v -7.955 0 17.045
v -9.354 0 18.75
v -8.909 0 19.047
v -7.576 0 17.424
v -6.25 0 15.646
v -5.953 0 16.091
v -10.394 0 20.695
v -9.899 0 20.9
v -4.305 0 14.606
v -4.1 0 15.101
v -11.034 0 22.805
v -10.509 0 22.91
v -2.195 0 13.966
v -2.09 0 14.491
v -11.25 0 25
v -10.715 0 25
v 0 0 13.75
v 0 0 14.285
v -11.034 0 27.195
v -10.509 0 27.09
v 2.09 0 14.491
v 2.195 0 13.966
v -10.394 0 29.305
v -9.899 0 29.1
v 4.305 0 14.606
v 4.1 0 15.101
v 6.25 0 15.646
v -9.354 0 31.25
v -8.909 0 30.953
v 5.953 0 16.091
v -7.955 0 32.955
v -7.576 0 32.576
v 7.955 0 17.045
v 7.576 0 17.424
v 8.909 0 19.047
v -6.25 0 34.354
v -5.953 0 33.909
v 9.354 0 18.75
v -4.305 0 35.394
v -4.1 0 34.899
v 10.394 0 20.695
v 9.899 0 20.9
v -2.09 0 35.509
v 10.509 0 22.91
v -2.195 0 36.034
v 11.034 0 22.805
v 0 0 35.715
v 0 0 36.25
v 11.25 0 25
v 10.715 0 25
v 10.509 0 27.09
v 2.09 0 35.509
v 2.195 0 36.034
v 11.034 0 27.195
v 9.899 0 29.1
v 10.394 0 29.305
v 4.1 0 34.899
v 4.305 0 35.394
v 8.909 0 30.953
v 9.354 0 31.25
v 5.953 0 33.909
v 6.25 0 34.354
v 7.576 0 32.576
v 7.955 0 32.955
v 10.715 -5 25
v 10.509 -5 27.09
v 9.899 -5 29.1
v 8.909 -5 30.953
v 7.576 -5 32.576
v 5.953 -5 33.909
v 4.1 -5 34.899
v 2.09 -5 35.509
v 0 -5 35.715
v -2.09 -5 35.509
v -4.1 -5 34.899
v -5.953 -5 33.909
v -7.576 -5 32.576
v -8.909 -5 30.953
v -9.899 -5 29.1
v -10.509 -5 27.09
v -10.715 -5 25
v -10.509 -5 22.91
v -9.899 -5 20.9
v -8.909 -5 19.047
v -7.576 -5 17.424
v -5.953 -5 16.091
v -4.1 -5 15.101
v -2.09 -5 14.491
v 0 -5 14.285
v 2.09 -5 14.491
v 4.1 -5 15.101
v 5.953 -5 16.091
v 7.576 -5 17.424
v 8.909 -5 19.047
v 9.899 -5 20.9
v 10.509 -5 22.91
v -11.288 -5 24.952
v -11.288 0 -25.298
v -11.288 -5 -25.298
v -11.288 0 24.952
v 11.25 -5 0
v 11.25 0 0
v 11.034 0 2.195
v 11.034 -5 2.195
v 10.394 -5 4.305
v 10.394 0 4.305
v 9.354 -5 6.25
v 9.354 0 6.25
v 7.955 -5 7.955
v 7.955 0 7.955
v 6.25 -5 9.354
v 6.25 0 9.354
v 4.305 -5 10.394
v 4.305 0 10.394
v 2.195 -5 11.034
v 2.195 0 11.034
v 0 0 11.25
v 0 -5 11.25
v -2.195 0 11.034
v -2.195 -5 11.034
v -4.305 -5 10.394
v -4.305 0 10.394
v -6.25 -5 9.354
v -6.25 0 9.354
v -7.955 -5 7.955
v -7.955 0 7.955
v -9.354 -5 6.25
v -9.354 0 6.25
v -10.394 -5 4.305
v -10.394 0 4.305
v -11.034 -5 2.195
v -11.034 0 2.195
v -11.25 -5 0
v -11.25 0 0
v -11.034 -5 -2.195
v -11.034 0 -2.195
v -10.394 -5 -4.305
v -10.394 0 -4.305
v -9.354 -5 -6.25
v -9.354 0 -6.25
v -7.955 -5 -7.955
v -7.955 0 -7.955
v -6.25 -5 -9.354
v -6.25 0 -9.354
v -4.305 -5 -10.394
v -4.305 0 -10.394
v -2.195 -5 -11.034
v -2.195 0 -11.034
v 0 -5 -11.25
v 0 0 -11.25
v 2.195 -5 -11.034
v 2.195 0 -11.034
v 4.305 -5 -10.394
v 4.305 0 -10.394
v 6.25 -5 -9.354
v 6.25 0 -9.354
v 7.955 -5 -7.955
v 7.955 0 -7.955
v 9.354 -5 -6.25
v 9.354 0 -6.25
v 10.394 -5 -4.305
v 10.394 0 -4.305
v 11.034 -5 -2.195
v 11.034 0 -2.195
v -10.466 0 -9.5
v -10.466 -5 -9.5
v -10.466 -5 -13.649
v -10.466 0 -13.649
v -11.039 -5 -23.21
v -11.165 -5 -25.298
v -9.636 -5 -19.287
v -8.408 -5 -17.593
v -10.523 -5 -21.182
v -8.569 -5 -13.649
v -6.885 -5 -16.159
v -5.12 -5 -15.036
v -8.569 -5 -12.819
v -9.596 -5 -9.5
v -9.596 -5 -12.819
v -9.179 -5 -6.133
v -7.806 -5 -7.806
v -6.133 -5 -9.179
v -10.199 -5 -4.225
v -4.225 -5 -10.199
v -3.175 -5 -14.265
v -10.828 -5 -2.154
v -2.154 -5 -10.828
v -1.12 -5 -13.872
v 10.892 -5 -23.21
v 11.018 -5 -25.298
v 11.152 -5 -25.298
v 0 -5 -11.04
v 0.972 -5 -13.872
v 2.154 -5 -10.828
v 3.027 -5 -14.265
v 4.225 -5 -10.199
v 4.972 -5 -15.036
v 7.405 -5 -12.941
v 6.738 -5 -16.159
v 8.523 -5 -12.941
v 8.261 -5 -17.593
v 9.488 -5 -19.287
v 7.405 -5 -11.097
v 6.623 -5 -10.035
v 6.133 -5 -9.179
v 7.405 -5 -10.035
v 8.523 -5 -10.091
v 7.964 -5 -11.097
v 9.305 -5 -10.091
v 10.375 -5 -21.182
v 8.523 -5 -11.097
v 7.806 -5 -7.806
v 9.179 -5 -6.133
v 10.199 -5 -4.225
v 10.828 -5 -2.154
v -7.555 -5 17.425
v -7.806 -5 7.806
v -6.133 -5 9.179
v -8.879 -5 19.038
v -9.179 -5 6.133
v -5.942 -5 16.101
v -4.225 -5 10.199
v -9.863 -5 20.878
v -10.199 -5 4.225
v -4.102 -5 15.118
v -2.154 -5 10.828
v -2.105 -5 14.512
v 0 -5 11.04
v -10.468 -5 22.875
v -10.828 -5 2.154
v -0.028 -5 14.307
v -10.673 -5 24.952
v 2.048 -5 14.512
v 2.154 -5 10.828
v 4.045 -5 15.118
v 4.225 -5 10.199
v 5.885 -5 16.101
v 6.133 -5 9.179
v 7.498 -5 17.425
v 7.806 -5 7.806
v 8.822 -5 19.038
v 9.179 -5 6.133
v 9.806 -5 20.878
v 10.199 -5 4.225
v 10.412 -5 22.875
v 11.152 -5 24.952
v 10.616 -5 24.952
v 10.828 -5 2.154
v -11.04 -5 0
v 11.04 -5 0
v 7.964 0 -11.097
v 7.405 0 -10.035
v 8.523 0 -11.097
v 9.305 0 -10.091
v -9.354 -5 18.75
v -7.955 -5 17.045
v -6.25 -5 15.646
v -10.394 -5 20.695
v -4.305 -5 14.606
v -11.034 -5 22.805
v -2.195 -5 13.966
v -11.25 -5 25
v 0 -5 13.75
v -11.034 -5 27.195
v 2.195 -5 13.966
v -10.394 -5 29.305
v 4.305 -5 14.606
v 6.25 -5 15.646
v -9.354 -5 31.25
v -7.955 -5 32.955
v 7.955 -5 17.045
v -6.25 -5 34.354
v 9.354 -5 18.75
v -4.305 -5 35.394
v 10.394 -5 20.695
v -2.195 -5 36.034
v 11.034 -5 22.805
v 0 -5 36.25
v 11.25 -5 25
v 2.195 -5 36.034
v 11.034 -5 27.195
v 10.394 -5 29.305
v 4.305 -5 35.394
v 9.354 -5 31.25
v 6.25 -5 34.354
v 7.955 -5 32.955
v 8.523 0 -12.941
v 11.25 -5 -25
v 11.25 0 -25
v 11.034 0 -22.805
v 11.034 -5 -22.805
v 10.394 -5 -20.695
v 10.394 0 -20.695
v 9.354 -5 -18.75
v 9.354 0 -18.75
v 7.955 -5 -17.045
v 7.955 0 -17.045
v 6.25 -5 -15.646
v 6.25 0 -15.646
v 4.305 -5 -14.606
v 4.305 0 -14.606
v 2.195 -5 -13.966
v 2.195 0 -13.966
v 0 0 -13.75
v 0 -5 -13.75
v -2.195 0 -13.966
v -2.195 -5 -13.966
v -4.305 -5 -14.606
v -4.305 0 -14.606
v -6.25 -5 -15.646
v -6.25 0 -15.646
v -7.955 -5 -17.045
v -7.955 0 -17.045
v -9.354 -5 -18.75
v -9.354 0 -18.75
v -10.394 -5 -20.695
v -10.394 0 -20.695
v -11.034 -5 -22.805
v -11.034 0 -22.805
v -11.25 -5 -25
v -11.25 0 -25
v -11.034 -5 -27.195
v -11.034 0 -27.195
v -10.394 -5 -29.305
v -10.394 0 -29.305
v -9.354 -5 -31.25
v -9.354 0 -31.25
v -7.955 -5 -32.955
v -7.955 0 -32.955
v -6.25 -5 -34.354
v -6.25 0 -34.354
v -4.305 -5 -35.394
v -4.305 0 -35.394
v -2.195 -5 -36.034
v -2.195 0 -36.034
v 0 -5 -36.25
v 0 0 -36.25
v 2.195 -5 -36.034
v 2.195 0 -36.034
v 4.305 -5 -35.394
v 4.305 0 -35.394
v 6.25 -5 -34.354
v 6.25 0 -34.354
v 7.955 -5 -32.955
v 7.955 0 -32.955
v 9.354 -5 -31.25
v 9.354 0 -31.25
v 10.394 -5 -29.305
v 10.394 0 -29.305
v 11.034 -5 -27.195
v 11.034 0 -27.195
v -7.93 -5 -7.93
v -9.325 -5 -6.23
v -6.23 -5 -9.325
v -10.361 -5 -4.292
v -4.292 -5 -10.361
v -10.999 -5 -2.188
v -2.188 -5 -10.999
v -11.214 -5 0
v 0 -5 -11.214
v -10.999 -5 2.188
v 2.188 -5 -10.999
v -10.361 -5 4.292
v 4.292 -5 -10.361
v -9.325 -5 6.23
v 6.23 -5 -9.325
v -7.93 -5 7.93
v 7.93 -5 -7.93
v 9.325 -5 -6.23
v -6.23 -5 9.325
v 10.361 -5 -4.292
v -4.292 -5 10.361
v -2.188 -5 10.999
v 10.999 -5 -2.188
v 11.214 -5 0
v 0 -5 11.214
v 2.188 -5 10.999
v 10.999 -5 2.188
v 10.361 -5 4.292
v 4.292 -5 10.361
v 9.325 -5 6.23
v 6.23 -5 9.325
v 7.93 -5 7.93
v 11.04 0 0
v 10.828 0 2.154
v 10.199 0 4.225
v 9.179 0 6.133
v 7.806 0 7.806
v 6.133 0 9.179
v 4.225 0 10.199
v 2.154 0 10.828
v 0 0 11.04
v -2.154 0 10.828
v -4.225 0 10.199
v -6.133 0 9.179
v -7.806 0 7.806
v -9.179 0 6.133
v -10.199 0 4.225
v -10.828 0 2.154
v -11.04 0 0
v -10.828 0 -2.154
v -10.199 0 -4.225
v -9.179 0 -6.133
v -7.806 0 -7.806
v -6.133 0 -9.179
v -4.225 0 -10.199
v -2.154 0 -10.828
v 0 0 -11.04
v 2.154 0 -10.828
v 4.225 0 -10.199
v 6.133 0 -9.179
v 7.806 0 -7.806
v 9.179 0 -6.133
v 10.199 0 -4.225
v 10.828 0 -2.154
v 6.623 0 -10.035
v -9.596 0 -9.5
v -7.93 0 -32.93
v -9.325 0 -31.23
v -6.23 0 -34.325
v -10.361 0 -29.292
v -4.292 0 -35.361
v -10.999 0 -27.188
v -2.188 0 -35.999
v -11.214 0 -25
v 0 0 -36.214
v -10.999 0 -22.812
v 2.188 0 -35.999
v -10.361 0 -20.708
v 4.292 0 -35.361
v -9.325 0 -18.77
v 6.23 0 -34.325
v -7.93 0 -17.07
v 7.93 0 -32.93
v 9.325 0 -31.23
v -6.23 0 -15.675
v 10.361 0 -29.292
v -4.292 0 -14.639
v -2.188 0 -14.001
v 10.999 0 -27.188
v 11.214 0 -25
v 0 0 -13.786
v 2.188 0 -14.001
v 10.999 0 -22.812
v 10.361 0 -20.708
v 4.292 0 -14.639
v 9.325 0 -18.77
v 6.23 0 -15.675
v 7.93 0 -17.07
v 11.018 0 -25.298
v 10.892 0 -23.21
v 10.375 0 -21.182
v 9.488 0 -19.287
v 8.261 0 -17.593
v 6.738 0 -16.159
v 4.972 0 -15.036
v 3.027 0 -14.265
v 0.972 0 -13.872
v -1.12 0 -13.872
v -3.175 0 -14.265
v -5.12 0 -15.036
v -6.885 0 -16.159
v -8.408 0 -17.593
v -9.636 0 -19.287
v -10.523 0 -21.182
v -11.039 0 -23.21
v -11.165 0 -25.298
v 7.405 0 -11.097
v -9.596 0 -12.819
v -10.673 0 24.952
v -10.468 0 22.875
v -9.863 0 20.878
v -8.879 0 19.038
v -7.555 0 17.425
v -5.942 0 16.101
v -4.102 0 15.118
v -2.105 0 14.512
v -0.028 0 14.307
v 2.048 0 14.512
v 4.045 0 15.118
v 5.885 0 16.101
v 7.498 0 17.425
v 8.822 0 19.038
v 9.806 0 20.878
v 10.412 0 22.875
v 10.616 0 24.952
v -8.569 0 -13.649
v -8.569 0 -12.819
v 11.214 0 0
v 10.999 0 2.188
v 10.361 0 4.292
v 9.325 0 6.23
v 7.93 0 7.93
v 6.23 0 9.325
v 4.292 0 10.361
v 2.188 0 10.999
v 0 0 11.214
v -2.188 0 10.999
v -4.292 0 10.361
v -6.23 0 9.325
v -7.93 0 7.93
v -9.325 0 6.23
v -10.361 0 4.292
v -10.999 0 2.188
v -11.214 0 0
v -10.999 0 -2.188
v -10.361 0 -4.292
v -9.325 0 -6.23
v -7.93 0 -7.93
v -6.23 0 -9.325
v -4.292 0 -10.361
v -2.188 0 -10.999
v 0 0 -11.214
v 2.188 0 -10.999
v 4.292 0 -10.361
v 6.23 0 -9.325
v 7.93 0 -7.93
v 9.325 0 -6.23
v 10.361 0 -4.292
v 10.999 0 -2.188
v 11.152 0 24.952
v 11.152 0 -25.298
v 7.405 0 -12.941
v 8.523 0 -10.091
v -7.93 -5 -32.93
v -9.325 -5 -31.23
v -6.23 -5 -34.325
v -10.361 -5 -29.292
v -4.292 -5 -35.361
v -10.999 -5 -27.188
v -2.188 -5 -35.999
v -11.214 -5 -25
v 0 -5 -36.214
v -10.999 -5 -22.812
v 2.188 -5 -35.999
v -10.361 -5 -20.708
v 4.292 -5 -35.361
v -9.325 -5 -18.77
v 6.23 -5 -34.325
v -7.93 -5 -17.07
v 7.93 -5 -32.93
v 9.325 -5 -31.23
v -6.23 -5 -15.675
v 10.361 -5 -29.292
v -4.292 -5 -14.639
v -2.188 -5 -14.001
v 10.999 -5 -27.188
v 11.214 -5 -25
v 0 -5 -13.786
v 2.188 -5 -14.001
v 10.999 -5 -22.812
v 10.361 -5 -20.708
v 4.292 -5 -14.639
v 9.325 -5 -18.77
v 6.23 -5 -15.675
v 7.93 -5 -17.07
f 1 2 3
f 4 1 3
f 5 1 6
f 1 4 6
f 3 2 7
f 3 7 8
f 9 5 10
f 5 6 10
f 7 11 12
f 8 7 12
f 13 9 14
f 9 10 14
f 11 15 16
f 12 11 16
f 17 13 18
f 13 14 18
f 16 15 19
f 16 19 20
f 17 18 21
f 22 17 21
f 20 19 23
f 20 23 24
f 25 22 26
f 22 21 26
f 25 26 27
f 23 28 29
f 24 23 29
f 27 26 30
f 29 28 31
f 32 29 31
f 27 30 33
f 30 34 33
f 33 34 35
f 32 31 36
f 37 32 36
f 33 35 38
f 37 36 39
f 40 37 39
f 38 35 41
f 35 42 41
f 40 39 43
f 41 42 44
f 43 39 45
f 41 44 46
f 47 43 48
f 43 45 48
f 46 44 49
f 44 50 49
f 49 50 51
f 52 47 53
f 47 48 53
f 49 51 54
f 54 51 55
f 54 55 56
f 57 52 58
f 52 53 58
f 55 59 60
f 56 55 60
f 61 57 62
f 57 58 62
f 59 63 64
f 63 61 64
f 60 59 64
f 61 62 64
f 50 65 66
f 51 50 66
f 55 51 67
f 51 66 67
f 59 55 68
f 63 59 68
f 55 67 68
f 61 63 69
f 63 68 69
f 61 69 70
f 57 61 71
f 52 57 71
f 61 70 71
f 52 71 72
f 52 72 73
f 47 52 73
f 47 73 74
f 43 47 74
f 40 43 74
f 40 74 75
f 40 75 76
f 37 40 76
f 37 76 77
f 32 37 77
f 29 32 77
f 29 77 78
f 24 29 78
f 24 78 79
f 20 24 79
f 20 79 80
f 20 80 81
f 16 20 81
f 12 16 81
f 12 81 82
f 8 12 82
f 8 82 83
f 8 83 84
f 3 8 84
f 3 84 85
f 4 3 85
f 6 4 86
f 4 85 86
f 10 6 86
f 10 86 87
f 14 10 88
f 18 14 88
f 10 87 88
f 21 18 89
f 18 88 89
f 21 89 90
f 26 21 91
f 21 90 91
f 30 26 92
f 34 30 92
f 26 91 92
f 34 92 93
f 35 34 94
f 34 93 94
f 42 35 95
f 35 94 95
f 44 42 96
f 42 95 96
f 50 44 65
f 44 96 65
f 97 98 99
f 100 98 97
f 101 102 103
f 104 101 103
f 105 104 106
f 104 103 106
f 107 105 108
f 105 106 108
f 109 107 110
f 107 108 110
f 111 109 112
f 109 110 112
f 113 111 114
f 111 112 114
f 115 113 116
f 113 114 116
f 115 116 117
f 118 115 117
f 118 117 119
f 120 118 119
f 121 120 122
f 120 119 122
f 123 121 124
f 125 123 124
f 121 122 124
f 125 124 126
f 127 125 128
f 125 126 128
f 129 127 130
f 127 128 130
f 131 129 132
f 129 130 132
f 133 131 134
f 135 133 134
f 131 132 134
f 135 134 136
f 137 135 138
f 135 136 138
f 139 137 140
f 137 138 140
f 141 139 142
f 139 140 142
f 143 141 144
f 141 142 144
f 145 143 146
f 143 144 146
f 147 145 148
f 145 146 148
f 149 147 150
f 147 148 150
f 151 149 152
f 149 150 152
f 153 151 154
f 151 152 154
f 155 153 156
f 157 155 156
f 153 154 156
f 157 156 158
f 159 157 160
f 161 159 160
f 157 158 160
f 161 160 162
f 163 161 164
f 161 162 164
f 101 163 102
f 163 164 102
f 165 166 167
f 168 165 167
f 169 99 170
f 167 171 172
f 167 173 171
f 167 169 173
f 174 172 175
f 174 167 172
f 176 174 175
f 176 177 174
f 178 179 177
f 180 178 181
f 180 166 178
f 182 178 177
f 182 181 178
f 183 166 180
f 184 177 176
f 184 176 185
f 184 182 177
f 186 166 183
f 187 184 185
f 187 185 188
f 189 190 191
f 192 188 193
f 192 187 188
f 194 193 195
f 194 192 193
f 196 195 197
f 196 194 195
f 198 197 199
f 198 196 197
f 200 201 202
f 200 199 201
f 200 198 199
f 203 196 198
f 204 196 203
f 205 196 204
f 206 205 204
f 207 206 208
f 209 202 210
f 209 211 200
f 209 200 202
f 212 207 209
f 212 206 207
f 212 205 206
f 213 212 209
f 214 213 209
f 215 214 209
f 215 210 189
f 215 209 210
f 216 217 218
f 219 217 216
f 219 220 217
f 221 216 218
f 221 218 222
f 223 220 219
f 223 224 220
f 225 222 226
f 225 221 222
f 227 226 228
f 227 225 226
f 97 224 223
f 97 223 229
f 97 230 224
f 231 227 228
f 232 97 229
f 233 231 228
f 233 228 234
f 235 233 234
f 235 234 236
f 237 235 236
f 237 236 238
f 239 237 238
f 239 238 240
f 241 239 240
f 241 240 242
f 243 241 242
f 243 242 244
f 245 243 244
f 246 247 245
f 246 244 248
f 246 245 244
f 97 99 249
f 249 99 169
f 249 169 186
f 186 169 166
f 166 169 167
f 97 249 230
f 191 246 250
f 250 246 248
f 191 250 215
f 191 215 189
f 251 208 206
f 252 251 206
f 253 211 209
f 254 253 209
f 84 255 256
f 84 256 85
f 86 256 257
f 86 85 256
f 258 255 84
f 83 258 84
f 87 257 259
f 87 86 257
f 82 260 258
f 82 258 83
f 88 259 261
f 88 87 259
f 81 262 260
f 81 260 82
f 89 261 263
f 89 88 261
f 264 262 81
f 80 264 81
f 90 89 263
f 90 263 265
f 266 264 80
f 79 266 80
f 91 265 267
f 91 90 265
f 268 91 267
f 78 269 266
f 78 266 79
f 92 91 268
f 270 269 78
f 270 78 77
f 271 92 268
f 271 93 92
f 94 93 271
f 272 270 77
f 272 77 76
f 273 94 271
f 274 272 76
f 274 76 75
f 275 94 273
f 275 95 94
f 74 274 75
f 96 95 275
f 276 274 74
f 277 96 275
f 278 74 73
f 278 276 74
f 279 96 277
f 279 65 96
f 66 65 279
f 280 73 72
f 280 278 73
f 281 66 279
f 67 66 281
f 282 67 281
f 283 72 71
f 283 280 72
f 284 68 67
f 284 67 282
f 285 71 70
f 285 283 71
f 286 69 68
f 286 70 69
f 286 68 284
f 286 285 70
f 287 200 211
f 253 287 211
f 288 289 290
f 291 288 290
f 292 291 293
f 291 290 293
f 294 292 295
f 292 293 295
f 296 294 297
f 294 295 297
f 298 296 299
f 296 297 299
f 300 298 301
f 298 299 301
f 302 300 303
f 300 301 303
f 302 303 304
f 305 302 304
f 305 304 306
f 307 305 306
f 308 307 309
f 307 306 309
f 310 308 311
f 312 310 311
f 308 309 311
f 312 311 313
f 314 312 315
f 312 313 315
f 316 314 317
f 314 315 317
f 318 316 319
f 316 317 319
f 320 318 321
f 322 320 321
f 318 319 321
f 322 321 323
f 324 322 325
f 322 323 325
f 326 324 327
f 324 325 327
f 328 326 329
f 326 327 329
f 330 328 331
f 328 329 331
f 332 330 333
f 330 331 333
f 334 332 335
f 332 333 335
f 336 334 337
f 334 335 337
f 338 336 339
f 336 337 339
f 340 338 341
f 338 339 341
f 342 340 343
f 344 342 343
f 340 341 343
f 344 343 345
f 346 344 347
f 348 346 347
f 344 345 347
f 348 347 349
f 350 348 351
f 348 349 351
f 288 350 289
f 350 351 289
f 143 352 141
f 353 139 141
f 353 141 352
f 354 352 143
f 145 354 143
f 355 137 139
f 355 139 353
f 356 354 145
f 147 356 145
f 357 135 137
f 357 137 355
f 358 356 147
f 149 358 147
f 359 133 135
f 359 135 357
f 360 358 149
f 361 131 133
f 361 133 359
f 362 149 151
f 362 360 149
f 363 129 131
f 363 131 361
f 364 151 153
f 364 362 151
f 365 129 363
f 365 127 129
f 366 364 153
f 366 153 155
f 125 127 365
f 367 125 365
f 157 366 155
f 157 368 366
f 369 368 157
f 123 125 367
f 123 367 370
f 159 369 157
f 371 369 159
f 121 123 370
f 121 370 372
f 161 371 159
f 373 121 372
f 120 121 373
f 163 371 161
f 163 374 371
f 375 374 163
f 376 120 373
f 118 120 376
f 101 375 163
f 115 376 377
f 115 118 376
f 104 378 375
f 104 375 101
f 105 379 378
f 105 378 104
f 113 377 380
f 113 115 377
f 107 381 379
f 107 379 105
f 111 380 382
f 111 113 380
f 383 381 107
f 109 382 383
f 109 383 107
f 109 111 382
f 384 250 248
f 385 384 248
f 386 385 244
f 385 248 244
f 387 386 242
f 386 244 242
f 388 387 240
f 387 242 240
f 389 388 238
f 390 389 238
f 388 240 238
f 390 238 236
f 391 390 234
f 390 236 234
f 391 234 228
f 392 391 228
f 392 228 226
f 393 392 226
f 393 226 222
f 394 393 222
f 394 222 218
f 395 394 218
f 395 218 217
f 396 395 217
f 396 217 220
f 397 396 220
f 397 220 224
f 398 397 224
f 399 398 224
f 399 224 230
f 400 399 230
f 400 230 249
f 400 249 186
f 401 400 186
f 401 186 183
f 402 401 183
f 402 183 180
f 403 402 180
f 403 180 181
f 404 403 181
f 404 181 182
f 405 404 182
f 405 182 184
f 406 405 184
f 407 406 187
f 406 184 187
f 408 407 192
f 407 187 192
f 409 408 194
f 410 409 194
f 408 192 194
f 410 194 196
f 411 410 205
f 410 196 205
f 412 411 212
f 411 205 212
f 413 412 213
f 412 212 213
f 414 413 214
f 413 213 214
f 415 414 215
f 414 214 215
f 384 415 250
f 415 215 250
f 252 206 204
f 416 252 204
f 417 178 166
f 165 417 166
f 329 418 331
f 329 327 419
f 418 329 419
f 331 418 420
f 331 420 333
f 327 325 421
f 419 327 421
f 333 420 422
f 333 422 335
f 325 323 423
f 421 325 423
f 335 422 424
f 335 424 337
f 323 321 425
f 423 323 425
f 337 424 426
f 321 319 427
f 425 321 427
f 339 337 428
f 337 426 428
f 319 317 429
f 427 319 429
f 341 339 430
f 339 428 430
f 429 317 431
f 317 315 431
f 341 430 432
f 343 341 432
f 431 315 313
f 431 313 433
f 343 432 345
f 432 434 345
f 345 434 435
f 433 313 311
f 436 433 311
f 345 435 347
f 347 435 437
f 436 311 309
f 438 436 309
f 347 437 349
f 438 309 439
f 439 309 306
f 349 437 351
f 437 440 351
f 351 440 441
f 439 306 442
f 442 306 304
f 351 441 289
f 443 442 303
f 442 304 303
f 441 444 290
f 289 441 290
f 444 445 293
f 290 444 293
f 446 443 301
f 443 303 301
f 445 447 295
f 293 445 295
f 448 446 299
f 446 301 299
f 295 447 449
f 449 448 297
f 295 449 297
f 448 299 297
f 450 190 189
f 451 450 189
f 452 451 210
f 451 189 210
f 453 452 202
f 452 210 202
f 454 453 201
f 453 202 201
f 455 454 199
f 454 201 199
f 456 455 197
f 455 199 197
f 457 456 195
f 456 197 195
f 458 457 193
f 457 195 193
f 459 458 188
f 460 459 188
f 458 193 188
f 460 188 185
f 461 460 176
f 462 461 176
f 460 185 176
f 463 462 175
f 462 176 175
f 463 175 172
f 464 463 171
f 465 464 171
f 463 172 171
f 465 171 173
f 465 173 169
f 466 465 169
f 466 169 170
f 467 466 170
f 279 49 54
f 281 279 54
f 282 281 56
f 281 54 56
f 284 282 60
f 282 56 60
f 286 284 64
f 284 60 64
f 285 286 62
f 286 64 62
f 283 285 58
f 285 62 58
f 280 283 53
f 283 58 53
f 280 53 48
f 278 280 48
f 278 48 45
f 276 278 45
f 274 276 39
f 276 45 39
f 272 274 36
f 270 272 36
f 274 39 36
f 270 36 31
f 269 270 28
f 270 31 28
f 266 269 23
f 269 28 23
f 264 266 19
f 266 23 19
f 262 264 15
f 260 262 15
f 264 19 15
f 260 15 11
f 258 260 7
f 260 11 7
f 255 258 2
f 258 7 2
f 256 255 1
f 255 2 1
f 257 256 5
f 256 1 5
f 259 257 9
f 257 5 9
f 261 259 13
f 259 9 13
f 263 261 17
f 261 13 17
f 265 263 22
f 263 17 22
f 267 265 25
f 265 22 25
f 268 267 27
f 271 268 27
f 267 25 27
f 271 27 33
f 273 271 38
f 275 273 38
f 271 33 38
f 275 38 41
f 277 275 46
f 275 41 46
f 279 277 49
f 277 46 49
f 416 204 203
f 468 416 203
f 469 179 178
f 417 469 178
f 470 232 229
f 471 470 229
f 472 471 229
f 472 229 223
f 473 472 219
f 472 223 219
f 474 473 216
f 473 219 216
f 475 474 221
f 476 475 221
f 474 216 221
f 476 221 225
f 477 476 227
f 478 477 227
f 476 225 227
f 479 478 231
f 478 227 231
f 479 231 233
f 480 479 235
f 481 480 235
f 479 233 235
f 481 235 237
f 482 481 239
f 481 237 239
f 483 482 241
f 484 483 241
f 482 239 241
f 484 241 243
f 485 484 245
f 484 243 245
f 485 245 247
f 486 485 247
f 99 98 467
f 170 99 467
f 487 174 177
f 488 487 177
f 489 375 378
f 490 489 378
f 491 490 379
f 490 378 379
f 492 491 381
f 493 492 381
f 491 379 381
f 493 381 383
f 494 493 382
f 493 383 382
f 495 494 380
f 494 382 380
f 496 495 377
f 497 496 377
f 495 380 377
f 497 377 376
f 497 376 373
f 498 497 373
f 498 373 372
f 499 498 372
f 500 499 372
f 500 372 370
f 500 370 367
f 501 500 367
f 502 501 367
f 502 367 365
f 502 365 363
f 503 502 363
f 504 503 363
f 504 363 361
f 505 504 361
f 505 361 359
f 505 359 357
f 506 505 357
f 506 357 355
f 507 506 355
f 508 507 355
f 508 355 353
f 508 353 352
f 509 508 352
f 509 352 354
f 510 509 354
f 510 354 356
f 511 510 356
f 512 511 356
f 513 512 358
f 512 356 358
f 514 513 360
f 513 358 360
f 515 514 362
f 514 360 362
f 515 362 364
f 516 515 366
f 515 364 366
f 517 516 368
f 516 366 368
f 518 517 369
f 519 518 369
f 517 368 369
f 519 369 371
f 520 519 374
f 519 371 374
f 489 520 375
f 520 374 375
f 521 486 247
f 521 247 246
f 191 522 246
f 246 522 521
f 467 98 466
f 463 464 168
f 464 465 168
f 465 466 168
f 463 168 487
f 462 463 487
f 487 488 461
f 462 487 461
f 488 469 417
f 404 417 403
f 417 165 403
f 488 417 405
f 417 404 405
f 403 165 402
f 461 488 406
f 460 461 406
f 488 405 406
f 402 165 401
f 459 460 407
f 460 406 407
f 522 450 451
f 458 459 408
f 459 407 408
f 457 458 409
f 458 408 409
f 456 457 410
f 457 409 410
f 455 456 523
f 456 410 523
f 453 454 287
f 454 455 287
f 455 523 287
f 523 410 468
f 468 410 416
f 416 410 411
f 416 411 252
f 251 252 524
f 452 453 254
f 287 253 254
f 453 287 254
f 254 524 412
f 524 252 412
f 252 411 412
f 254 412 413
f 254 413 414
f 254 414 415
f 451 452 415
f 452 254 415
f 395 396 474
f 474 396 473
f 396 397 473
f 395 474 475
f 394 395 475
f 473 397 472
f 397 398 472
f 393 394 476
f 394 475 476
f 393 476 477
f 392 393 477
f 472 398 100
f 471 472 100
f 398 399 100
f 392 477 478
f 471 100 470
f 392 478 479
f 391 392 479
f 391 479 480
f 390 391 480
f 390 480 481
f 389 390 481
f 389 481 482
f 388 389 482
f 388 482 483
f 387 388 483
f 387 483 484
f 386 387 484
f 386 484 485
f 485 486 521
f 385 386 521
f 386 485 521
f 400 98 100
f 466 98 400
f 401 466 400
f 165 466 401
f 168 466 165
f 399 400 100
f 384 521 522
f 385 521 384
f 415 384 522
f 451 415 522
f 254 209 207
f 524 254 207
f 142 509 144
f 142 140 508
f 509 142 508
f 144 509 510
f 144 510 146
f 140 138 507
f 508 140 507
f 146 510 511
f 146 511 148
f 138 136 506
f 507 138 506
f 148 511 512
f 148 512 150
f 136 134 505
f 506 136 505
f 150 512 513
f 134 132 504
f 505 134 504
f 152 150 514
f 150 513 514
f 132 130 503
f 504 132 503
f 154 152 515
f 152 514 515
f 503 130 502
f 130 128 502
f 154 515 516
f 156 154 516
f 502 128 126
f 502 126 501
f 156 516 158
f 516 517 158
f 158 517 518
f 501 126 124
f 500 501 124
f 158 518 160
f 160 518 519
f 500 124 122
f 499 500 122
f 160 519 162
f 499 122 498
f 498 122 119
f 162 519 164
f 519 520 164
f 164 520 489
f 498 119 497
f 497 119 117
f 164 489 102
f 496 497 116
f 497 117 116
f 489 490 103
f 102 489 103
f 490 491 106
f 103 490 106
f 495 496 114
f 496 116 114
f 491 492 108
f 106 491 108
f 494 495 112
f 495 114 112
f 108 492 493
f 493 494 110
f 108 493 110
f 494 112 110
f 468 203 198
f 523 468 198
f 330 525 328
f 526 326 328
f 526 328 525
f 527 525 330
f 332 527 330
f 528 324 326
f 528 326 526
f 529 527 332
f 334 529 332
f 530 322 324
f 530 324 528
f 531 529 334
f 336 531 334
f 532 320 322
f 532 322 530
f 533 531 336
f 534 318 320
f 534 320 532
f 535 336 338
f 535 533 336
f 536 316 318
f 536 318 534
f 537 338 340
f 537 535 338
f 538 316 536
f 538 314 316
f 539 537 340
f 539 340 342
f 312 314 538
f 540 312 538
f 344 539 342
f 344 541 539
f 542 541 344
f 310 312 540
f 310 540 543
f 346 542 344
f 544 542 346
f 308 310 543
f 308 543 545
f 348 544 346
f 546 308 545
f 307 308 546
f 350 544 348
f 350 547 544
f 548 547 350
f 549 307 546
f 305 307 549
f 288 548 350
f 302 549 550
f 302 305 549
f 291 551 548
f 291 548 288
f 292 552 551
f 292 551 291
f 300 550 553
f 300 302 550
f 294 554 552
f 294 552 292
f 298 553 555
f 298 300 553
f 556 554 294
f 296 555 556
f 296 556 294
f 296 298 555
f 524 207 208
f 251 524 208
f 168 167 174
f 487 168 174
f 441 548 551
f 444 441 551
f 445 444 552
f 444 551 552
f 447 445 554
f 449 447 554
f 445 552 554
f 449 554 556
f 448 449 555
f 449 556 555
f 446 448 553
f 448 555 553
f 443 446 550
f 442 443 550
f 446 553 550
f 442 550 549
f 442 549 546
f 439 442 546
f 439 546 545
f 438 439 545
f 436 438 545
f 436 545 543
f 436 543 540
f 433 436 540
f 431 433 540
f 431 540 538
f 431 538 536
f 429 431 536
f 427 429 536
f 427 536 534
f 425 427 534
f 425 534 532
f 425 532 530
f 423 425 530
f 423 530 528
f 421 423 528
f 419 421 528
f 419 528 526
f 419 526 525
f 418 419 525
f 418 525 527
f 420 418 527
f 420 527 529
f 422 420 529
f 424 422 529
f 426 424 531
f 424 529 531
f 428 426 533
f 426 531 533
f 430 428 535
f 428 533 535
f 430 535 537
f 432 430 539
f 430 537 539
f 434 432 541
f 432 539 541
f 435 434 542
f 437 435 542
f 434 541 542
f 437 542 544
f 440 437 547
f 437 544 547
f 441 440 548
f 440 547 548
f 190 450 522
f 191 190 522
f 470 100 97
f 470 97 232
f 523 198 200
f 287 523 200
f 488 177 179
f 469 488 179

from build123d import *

# Parameters (mm, degrees)
F0_R      = 11.25
F1_DEPTH  = 5
F2_R      = 10.714565
F3_DEPTH  = 25
F4_R      = 11.2145
F5_DEPTH  = 25
F6_R      = 11.2145
F7_DEPTH  = 25
F8_W      = 22.440505
F8_H      = 50.249798
F9_DEPTH  = 5
F11_DEPTH = 25
F12_R     = 11.039659
F13_DEPTH = 25
F15_DEPTH = 25
F17_DEPTH = 25
F19_DEPTH = 25


with BuildPart() as f1:
    # F0 (on Front) → F1 (new body)
    with BuildSketch(Plane.XZ):
        with Locations((0, 25)):
            Circle(F0_R)
        Circle(F0_R)
        with Locations((0, -25)):
            Circle(F0_R)
    extrude(amount=F1_DEPTH)

    # F2 (on face) → F3 (cut)
    with BuildSketch(Plane.XZ.offset(5)):
        with Locations((0, 25)):
            Circle(F2_R)
    extrude(amount=-F3_DEPTH, mode=Mode.SUBTRACT)

    # F4 (on face) → F5 (cut)
    with BuildSketch(Plane.XZ.offset(5)):
        Circle(F4_R)
    extrude(amount=-F5_DEPTH, mode=Mode.SUBTRACT)

    # F6 (on face) → F7 (cut)
    with BuildSketch(Plane.XZ.offset(5)):
        with Locations((0, -25)):
            Circle(F6_R)
    extrude(amount=-F7_DEPTH, mode=Mode.SUBTRACT)


with BuildPart() as f9:
    # F8 (on Front) → F9 (new body)
    with BuildSketch(Plane.XZ):
        with Locations((-0.068217, -0.172931)):
            Rectangle(F8_W, F8_H)
    extrude(amount=F9_DEPTH)

    # F10 (on face) → F11 (cut)
    with BuildSketch(Plane.XZ.offset(5)):
        with BuildLine():
            Line((10.61618, 24.951968), (-10.673006, 24.951968))
            ThreePointArc((-10.673006, 24.951968), (-0.028413, 14.307375), (10.61618, 24.951968))
        make_face()
    extrude(amount=-F11_DEPTH, mode=Mode.SUBTRACT)

    # F12 (on face) → F13 (cut)
    with BuildSketch(Plane.XZ.offset(5)):
        Circle(F12_R)
    extrude(amount=-F13_DEPTH, mode=Mode.SUBTRACT)

    # F14 (on face) → F15 (cut)
    with BuildSketch(Plane.XZ.offset(5)):
        with BuildLine():
            Line((-11.165318, -25.29783), (11.017901, -25.29783))
            ThreePointArc((11.017901, -25.29783), (-0.073709, -13.822976), (-11.165318, -25.29783))
        make_face()
    extrude(amount=-F15_DEPTH, mode=Mode.SUBTRACT)

    # F16 (on face) → F17 (cut)
    with BuildSketch(Plane.XZ.offset(5)):
        Polygon((-9.596423, -9.50045), (-10.465668, -9.50045), (-10.465668, -13.649115), (-8.569135, -13.649115), (-8.569135, -12.819382), (-9.596423, -12.819382), align=None)
    extrude(amount=-F17_DEPTH, mode=Mode.SUBTRACT)

    # F18 (on face) → F19 (cut)
    with BuildSketch(Plane.XZ.offset(5)):
        Polygon((7.405112, -10.035326), (6.622832, -10.035326), (7.405112, -11.096991), (7.405112, -12.940936), (8.522655, -12.940936), (8.522655, -11.096991), (9.304934, -10.091203), (8.522655, -10.091203), (7.963884, -11.096991), align=None)
    extrude(amount=-F19_DEPTH, mode=Mode.SUBTRACT)


solid = Compound([f1.part, f9.part])
